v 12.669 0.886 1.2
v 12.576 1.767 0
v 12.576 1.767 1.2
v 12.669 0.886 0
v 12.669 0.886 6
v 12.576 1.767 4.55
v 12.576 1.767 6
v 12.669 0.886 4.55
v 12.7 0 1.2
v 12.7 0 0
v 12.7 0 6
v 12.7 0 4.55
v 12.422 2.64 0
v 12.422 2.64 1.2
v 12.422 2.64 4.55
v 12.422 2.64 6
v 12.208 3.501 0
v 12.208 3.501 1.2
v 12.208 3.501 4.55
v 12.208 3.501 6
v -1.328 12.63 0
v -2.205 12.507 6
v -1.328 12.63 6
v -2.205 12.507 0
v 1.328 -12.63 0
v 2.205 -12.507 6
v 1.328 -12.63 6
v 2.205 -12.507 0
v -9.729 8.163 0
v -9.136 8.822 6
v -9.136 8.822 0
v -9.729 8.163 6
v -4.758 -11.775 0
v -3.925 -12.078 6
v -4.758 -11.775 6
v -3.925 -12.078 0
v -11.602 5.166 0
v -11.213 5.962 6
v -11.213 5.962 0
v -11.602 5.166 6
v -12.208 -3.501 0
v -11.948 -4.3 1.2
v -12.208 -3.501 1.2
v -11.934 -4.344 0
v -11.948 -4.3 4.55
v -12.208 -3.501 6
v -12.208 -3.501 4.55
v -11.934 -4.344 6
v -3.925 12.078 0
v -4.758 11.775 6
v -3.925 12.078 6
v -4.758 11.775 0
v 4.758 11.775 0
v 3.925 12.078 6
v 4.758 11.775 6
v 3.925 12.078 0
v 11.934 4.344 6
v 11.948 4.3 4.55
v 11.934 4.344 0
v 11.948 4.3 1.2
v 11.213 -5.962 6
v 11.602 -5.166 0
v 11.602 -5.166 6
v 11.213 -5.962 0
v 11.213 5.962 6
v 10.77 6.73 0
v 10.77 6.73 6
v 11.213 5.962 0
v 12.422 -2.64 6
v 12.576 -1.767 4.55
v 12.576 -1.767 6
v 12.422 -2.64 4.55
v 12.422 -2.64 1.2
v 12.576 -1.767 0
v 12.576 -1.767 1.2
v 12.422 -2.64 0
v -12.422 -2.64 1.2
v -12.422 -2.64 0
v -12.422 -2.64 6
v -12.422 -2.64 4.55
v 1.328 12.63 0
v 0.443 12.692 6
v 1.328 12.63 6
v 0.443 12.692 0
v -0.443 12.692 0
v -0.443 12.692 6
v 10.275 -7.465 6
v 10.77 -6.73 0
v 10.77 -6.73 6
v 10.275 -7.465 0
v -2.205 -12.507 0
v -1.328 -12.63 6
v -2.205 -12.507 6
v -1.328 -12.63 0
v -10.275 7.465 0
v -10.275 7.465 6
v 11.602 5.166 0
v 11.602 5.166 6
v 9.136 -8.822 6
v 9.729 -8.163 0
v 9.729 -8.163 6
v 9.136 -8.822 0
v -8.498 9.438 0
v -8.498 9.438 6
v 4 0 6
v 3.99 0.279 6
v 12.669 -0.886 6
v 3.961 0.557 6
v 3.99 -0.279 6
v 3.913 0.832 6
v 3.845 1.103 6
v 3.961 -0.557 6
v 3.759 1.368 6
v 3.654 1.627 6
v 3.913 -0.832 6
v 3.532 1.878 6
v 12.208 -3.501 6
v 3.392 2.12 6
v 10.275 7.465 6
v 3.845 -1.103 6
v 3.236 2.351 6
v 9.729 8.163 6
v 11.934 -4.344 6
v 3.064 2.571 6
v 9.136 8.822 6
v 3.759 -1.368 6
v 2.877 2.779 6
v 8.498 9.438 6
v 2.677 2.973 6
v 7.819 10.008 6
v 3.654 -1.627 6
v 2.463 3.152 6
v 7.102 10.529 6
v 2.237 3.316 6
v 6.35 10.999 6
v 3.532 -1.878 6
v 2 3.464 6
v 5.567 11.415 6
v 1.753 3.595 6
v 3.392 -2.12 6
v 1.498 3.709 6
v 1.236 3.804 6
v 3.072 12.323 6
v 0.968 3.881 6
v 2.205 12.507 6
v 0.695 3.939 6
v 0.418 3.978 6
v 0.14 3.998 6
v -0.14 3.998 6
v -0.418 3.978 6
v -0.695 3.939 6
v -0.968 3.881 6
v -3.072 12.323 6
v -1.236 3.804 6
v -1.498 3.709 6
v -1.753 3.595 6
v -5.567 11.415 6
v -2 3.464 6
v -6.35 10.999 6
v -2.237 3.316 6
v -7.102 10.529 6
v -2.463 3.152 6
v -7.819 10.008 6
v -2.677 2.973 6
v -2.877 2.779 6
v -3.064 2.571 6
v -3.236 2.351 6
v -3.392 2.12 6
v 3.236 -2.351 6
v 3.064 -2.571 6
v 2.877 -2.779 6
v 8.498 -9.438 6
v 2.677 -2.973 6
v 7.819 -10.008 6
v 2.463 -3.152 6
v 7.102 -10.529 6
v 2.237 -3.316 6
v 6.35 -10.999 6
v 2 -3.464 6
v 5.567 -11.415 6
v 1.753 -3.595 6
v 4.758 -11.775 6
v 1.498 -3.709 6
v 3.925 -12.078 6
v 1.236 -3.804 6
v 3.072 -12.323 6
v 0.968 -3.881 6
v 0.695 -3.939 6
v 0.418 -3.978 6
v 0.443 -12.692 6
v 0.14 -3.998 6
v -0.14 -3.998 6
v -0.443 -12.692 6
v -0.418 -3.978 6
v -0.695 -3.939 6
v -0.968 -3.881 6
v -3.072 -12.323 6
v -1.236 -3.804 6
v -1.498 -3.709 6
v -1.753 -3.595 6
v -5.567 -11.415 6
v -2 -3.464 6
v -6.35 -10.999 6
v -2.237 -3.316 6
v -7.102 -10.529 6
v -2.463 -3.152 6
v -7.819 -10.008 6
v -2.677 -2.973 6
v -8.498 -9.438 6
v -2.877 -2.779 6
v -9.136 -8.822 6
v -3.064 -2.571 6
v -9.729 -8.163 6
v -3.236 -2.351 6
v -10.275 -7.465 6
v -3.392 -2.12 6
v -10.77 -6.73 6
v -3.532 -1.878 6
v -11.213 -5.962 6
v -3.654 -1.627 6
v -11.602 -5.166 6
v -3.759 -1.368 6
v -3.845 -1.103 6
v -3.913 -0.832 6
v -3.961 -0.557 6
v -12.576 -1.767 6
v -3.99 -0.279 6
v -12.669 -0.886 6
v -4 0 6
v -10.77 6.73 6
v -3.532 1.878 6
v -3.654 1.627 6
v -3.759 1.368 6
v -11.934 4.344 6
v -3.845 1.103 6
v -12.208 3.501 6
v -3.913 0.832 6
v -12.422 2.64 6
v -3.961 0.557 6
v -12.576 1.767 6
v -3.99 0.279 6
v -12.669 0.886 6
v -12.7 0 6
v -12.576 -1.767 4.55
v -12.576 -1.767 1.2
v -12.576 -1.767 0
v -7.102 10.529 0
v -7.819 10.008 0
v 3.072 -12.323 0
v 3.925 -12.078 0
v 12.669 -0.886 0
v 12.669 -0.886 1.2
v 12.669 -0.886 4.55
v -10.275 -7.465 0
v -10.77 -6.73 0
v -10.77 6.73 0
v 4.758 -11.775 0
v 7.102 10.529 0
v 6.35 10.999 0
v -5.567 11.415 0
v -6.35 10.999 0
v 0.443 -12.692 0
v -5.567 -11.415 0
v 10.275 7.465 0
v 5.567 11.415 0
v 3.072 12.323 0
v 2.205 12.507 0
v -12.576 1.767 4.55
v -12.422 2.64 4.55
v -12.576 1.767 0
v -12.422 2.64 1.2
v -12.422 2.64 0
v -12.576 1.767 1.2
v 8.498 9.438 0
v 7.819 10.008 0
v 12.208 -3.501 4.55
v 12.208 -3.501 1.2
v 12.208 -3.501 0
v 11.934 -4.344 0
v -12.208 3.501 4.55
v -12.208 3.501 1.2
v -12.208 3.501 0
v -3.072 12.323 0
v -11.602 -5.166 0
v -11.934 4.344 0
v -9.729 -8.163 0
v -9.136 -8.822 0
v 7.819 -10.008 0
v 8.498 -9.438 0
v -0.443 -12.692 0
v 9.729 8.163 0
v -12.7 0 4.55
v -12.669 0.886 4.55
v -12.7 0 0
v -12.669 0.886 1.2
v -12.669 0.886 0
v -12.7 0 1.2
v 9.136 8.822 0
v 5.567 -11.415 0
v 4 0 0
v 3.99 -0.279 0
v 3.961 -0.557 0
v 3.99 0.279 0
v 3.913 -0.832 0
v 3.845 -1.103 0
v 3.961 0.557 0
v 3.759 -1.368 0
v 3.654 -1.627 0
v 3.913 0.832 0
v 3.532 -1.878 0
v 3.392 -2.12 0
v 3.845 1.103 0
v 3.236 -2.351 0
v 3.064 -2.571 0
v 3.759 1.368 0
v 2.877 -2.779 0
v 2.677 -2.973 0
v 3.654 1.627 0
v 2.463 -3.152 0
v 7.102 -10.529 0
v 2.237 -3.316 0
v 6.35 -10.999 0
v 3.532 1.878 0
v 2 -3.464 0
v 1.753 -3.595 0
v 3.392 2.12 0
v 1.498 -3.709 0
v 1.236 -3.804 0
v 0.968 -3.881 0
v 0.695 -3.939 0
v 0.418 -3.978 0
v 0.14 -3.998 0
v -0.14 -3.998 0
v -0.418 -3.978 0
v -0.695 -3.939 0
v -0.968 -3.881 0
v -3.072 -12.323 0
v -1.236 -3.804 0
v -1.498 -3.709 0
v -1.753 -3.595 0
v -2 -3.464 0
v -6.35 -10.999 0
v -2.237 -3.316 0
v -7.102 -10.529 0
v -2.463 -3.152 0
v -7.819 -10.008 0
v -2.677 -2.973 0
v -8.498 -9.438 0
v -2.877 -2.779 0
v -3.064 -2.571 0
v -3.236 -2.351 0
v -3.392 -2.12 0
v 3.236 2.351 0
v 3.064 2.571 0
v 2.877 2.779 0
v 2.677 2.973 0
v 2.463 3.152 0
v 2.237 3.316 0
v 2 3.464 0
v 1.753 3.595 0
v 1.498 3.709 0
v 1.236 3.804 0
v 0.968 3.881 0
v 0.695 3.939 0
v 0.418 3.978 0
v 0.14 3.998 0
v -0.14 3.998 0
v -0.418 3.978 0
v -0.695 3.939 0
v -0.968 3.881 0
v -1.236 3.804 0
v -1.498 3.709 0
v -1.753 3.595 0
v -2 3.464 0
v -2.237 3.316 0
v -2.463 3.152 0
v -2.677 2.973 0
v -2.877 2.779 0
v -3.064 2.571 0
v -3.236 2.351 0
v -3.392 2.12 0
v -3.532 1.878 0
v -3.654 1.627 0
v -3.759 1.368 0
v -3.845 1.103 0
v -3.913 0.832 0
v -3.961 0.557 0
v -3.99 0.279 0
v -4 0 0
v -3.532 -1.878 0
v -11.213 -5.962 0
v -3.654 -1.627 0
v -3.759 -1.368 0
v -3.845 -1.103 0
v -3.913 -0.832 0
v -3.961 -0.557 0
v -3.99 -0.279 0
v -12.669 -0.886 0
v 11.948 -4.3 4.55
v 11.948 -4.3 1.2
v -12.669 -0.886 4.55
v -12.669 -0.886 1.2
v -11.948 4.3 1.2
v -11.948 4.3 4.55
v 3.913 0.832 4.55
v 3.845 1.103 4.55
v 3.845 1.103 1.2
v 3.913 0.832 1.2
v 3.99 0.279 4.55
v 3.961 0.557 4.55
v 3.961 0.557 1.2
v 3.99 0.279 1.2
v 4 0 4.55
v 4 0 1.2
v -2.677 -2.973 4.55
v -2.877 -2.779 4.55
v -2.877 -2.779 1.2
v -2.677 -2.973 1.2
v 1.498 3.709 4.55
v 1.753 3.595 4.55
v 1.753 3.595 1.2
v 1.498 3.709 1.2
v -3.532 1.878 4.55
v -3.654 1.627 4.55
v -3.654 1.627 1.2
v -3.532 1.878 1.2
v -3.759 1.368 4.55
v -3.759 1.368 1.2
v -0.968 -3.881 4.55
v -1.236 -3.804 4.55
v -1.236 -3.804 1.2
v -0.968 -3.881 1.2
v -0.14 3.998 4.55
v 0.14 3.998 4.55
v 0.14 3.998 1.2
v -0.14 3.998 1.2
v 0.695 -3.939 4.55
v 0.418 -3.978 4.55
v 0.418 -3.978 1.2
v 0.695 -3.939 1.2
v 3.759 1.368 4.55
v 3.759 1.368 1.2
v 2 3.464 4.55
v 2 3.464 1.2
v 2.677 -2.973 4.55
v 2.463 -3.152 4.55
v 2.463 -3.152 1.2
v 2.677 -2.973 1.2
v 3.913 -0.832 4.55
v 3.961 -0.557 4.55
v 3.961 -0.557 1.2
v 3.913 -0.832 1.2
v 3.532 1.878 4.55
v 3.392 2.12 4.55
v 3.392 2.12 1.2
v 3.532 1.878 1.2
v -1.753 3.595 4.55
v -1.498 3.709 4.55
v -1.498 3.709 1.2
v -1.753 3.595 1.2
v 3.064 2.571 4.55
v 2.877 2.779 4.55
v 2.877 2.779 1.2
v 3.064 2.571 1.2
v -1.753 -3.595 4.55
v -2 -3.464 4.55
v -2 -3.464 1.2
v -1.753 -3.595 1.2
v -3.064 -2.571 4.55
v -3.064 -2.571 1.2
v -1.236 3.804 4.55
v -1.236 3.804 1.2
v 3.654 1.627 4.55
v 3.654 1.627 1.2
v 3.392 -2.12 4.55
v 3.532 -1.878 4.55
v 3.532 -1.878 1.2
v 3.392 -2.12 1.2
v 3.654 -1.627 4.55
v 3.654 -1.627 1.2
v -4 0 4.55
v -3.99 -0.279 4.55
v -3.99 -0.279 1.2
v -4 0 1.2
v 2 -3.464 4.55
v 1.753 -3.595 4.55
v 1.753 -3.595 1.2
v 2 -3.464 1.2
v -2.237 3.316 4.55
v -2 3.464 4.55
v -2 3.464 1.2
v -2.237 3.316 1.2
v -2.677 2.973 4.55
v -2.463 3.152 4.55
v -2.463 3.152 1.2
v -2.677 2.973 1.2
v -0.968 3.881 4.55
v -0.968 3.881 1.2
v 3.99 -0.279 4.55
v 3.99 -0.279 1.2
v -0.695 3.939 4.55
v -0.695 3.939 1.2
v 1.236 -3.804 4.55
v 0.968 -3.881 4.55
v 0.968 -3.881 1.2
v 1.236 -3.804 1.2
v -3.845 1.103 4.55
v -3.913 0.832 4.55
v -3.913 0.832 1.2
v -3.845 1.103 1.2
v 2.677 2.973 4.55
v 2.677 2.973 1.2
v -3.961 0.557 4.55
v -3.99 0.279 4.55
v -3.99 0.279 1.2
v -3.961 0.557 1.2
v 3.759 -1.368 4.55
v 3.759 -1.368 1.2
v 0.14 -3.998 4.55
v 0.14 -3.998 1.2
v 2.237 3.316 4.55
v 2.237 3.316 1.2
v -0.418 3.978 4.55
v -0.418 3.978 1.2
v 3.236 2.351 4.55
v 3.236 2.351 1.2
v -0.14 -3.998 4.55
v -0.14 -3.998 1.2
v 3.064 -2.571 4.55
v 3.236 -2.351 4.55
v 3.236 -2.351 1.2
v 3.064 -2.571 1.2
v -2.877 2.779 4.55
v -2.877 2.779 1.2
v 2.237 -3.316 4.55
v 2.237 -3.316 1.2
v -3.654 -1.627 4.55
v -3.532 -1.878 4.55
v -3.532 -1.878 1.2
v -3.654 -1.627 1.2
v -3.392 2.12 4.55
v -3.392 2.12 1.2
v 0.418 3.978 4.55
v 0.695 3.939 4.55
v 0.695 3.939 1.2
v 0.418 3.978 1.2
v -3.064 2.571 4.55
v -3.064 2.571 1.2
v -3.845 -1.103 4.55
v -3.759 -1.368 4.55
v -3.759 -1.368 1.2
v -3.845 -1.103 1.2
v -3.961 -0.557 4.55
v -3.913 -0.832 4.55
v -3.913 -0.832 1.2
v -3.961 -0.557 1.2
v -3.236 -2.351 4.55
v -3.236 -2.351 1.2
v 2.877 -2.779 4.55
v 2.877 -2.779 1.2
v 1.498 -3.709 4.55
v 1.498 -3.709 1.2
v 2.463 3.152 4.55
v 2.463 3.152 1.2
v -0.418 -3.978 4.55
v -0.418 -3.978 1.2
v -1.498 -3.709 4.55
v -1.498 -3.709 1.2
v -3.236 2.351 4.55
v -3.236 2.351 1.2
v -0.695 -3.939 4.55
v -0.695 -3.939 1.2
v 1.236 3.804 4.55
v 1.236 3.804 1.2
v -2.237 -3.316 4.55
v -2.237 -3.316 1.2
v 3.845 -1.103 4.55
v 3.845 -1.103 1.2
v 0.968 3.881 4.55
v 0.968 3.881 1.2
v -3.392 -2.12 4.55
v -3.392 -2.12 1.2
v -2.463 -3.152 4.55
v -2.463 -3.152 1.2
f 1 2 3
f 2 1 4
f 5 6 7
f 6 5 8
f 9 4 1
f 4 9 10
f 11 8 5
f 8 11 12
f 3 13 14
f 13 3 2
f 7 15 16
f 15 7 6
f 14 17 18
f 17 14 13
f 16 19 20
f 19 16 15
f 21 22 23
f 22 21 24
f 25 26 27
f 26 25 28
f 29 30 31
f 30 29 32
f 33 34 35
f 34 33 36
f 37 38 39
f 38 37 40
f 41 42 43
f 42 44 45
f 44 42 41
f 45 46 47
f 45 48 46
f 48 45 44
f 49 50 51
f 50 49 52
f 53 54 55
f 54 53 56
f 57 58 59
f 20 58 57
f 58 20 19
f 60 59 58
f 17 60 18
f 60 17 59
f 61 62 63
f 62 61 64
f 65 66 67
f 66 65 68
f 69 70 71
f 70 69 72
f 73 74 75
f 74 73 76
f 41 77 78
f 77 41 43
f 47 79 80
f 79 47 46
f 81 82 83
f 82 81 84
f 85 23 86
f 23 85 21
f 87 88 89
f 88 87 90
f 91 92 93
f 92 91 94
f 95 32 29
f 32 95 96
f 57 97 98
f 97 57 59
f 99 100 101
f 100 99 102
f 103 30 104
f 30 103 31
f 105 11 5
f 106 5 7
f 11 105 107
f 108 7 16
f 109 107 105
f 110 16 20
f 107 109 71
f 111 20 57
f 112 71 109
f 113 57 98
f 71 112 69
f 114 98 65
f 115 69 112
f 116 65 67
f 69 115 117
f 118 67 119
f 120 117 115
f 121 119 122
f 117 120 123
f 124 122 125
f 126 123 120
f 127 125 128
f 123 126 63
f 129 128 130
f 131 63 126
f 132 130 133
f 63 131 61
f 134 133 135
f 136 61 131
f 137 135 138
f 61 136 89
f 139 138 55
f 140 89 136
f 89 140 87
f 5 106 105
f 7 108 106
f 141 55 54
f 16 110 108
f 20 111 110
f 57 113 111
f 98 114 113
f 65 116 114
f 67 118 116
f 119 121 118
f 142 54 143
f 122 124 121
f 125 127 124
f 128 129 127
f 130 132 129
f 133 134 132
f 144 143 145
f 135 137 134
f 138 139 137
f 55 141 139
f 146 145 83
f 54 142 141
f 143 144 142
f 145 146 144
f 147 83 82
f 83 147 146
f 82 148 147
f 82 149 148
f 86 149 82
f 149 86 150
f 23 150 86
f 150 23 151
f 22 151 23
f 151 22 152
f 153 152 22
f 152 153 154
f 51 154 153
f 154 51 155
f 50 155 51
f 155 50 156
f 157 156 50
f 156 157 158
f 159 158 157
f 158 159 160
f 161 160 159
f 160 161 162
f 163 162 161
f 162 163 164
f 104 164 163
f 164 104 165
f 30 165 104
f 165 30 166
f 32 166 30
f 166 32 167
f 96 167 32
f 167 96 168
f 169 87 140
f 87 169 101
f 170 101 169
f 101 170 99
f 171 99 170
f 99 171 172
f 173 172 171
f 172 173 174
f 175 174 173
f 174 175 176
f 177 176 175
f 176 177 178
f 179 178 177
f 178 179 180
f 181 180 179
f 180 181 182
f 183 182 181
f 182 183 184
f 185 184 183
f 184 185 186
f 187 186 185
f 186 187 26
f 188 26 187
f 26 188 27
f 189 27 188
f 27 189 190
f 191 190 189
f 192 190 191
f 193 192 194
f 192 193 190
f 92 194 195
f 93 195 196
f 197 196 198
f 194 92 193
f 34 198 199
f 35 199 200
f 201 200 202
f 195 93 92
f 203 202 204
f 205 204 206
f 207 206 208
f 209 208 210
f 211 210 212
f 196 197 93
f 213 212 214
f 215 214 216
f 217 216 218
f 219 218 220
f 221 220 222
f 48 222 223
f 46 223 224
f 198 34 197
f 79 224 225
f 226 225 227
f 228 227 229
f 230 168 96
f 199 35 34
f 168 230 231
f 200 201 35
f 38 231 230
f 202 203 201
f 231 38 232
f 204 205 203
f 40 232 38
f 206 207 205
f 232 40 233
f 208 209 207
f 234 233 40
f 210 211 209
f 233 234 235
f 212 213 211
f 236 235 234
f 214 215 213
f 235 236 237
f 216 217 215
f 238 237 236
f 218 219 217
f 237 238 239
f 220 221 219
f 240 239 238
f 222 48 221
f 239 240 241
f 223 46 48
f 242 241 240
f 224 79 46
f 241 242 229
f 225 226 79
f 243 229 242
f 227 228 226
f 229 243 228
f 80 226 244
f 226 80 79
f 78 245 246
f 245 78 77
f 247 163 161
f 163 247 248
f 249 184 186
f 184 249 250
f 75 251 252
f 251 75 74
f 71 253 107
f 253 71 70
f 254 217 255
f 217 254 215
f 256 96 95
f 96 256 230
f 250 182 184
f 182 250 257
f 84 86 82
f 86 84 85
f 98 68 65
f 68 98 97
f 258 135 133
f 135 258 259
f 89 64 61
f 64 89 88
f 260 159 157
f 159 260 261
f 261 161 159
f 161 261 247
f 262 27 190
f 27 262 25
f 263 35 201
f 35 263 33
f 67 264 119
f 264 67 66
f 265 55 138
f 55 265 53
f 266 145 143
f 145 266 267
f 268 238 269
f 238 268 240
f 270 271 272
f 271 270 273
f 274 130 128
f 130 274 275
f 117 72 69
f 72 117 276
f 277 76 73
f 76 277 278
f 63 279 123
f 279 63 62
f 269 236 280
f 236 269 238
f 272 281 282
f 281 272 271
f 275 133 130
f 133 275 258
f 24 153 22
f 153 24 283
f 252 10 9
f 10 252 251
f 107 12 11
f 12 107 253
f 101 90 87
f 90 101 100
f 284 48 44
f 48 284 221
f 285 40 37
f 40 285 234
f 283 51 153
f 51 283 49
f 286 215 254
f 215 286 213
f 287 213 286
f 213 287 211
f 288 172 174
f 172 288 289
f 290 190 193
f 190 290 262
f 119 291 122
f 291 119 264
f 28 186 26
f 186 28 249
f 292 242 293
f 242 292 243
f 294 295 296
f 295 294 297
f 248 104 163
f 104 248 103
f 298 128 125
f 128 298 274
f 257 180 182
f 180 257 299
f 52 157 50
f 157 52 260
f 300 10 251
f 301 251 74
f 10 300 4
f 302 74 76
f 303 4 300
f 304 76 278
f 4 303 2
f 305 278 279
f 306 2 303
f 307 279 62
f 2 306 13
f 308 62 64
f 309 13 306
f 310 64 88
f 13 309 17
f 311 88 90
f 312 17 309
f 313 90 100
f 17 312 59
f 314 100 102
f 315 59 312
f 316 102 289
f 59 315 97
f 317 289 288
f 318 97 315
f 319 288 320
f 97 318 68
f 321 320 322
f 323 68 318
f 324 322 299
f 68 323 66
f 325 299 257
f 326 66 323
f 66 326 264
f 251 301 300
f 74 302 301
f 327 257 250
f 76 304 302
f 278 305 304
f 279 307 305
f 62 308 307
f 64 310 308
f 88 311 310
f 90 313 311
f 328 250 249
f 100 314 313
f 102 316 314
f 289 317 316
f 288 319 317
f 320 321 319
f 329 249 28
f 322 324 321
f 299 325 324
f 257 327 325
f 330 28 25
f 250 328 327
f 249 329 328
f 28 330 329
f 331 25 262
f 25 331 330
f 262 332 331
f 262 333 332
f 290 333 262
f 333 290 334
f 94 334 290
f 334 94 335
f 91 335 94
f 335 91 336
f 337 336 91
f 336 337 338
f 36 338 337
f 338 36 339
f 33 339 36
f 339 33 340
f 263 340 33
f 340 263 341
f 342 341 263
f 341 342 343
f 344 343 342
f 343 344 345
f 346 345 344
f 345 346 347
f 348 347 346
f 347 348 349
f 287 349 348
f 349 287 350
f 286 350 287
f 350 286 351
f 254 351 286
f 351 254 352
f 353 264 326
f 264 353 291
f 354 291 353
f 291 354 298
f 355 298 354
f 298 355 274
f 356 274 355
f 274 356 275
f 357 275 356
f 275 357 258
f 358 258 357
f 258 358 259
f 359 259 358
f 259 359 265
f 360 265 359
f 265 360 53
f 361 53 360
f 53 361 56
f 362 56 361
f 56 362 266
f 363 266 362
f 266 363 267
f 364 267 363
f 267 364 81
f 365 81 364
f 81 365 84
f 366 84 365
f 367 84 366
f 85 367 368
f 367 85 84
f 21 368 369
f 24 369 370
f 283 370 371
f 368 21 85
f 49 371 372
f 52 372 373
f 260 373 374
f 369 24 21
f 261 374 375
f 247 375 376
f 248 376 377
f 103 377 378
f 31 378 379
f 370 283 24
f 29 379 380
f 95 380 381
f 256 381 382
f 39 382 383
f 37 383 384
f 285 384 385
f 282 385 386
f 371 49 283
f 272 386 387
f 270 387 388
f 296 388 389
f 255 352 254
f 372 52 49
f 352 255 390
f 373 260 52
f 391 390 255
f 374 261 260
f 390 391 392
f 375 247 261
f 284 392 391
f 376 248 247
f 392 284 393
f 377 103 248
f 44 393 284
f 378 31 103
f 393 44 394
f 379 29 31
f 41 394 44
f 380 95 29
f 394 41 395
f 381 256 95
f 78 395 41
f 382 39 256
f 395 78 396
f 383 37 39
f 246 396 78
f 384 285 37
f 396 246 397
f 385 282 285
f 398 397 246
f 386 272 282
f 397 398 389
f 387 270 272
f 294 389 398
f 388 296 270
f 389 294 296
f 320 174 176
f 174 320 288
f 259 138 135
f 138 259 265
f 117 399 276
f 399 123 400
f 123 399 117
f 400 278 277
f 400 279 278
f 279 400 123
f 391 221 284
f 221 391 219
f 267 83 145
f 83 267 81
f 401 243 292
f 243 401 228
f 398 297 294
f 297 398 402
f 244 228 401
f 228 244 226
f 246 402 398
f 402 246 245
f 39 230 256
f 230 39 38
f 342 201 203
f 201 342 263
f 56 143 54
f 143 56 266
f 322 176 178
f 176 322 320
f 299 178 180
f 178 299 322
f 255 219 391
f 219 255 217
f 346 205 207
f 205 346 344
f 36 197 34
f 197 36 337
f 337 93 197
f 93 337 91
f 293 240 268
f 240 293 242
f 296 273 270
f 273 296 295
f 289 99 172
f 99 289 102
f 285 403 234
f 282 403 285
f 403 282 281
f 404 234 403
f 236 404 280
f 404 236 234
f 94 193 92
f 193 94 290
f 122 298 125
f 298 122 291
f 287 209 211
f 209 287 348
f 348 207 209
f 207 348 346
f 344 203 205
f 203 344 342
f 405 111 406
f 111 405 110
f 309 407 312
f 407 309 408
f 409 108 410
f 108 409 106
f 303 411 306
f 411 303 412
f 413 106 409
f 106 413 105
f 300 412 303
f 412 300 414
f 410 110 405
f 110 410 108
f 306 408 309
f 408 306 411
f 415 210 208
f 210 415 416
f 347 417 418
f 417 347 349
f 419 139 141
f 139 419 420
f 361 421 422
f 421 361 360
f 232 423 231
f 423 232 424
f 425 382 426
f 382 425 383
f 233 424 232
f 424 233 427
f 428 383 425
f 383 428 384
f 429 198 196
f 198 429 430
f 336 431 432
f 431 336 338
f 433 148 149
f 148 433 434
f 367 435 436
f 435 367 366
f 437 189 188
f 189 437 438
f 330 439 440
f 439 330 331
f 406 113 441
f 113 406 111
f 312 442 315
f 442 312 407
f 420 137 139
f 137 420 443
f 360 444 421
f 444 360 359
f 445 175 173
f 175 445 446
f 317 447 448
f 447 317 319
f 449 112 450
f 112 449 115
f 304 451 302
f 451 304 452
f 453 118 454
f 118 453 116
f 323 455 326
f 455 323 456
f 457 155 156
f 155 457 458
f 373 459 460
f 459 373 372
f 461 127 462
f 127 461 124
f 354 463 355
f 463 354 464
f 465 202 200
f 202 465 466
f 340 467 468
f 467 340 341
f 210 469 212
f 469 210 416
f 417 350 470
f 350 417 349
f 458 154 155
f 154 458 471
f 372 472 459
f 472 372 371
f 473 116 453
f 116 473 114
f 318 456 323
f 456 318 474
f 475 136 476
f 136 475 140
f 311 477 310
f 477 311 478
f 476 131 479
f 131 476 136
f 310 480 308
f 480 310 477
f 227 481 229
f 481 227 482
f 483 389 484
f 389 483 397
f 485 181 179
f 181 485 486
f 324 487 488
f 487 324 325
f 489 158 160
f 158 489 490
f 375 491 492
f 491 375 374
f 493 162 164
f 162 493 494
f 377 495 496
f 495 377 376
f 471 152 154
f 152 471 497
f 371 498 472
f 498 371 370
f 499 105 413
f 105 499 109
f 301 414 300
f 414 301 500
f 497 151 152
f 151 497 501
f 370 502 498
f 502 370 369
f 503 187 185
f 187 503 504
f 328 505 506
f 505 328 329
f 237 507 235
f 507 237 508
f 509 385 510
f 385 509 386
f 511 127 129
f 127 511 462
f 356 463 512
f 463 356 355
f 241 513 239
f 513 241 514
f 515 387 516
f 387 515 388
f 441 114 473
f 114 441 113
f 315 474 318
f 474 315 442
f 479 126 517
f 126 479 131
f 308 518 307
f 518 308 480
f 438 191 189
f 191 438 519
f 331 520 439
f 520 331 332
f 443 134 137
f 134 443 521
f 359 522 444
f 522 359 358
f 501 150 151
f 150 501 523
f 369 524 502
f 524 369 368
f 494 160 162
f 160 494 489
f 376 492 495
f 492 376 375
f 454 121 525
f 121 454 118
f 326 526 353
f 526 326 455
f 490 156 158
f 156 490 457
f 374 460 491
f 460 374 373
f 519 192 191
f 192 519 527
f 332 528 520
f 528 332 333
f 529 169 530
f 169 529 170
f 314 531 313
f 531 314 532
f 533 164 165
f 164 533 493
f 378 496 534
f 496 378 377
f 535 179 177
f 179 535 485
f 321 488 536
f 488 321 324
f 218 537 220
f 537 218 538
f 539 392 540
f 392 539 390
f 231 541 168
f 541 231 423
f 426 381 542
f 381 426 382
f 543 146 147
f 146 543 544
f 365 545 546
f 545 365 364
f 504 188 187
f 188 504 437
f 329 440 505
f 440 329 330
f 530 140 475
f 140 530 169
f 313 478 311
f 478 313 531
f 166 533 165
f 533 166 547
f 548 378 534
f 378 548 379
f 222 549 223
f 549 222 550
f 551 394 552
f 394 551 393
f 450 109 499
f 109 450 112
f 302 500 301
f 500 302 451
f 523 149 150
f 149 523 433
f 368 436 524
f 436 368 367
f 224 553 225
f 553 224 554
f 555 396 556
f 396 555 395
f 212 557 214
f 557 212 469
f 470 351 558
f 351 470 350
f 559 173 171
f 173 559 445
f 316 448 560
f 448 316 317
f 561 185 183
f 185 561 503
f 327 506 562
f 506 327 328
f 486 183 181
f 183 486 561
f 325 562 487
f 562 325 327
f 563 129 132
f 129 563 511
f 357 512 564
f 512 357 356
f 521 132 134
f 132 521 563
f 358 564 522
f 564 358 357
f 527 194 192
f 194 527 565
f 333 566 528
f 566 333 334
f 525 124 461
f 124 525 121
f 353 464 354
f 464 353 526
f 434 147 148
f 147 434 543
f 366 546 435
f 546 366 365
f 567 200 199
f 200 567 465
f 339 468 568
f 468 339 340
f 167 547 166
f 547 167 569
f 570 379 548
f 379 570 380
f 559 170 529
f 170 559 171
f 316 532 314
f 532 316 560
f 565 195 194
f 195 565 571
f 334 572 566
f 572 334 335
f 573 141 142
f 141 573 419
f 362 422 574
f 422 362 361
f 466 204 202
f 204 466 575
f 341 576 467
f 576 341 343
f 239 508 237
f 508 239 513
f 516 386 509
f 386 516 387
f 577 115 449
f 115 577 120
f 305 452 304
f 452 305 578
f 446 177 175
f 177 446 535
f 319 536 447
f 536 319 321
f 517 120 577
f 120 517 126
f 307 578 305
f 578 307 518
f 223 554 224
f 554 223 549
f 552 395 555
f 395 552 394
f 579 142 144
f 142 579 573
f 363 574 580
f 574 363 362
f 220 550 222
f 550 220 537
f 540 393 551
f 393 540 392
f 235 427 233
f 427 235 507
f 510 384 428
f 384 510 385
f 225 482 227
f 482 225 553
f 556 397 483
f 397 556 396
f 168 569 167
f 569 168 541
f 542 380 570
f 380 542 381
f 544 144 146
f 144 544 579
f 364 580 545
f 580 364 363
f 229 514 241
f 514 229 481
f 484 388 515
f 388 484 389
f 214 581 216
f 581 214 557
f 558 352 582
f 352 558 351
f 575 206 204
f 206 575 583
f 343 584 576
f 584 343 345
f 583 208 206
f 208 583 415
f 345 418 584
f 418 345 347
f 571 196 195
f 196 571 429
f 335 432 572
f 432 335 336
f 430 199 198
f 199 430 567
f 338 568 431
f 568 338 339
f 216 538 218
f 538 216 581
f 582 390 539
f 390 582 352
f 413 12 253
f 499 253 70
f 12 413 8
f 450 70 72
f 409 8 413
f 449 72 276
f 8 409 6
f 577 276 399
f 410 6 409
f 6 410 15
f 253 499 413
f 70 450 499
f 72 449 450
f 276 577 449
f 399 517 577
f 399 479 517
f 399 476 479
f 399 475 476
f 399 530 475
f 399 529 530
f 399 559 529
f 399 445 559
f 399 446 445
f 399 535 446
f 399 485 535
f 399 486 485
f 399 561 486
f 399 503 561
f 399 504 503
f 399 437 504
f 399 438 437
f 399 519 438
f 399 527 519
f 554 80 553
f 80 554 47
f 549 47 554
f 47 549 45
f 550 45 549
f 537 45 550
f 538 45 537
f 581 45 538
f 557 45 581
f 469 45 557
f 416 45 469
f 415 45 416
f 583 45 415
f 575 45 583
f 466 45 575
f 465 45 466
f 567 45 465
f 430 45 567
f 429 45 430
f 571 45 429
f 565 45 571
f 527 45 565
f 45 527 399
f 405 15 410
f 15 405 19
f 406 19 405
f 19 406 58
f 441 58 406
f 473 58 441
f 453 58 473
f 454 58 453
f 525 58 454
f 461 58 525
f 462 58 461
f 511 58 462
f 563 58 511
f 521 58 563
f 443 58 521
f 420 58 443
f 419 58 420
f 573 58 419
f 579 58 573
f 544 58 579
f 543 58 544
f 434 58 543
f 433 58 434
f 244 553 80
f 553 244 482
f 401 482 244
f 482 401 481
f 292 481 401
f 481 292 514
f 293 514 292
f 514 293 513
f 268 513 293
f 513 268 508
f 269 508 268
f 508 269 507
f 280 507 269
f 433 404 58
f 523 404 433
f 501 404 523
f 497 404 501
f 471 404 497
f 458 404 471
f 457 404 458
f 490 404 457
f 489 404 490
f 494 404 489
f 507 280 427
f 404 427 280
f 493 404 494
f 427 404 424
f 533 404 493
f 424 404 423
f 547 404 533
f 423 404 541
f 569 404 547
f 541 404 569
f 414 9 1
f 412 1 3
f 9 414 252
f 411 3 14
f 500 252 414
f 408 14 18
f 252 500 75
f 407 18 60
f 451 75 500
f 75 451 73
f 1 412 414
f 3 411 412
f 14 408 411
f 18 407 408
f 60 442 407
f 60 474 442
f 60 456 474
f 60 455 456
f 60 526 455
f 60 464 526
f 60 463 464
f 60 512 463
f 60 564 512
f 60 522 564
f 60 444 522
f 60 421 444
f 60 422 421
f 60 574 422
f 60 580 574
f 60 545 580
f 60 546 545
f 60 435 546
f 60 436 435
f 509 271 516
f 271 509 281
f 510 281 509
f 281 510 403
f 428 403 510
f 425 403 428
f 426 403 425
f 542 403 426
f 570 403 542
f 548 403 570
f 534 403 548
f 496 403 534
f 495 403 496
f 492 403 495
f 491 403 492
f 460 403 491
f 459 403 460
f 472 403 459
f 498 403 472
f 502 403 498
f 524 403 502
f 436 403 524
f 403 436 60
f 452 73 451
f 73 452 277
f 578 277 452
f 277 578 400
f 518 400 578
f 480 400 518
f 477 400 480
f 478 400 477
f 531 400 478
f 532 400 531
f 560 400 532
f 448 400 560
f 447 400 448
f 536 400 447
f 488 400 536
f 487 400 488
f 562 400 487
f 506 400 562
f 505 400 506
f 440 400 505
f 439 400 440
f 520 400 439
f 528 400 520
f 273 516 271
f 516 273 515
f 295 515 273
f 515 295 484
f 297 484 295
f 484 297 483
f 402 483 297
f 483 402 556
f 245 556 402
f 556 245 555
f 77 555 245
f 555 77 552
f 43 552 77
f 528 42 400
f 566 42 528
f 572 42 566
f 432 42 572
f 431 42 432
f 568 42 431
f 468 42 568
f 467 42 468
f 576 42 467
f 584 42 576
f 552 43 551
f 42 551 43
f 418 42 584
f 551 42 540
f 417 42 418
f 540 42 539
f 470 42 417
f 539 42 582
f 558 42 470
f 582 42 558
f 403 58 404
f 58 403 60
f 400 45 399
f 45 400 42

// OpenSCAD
inch = 25.4;

// original reads came back as 1/4 inch (wrong part of the caliper)
// then it measured 7.5 mm
// the inside seems to shrink significantly during printing, though
axle_d = 8;

wheel_d = inch/2;
wheel_w = inch * 1.5;

hubcap_d = inch;
hubcap_w = 6;

inset_d = inch*3/16;
inset_w = 2.75;
end_w = 1.5;

pin_tol = 0.3;
overshot = 0.1;

$fn = 90;

module tube() {
  difference () {
    cylinder(d=wheel_d, h=wheel_w);
    translate([0,0,-overshot]) cylinder(d=axle_d, h=wheel_w + 2*overshot);
  }
}

module hubcap() {
  difference () {
    cylinder(d=hubcap_d, h=hubcap_w);
    translate([0,0,-overshot]) cylinder(d=axle_d, h=hubcap_w + 2*overshot);
    translate([-hubcap_d/2,-axle_d/2-pin_tol,end_w-pin_tol]) cube([hubcap_d,axle_d+2*pin_tol,inset_w+2*pin_tol]);
  }
}

module pin() {
  intersection() {
    difference() {
      cylinder(d=hubcap_d, h=inset_w);
      translate([0,0,-overshot]) cylinder(d=inset_d, h=inset_w + 2*overshot);
      translate([0,-inset_d/2,-overshot]) cube([hubcap_d/2,inset_d,inset_w+2*overshot]);
    }
    translate([-hubcap_d/2,-axle_d/2,0]) cube([hubcap_d,axle_d,inset_w]);
  }
}
hubcap();
/*translate([0,0,end_w]) color("yellow")*/ //pin();
//tube();
